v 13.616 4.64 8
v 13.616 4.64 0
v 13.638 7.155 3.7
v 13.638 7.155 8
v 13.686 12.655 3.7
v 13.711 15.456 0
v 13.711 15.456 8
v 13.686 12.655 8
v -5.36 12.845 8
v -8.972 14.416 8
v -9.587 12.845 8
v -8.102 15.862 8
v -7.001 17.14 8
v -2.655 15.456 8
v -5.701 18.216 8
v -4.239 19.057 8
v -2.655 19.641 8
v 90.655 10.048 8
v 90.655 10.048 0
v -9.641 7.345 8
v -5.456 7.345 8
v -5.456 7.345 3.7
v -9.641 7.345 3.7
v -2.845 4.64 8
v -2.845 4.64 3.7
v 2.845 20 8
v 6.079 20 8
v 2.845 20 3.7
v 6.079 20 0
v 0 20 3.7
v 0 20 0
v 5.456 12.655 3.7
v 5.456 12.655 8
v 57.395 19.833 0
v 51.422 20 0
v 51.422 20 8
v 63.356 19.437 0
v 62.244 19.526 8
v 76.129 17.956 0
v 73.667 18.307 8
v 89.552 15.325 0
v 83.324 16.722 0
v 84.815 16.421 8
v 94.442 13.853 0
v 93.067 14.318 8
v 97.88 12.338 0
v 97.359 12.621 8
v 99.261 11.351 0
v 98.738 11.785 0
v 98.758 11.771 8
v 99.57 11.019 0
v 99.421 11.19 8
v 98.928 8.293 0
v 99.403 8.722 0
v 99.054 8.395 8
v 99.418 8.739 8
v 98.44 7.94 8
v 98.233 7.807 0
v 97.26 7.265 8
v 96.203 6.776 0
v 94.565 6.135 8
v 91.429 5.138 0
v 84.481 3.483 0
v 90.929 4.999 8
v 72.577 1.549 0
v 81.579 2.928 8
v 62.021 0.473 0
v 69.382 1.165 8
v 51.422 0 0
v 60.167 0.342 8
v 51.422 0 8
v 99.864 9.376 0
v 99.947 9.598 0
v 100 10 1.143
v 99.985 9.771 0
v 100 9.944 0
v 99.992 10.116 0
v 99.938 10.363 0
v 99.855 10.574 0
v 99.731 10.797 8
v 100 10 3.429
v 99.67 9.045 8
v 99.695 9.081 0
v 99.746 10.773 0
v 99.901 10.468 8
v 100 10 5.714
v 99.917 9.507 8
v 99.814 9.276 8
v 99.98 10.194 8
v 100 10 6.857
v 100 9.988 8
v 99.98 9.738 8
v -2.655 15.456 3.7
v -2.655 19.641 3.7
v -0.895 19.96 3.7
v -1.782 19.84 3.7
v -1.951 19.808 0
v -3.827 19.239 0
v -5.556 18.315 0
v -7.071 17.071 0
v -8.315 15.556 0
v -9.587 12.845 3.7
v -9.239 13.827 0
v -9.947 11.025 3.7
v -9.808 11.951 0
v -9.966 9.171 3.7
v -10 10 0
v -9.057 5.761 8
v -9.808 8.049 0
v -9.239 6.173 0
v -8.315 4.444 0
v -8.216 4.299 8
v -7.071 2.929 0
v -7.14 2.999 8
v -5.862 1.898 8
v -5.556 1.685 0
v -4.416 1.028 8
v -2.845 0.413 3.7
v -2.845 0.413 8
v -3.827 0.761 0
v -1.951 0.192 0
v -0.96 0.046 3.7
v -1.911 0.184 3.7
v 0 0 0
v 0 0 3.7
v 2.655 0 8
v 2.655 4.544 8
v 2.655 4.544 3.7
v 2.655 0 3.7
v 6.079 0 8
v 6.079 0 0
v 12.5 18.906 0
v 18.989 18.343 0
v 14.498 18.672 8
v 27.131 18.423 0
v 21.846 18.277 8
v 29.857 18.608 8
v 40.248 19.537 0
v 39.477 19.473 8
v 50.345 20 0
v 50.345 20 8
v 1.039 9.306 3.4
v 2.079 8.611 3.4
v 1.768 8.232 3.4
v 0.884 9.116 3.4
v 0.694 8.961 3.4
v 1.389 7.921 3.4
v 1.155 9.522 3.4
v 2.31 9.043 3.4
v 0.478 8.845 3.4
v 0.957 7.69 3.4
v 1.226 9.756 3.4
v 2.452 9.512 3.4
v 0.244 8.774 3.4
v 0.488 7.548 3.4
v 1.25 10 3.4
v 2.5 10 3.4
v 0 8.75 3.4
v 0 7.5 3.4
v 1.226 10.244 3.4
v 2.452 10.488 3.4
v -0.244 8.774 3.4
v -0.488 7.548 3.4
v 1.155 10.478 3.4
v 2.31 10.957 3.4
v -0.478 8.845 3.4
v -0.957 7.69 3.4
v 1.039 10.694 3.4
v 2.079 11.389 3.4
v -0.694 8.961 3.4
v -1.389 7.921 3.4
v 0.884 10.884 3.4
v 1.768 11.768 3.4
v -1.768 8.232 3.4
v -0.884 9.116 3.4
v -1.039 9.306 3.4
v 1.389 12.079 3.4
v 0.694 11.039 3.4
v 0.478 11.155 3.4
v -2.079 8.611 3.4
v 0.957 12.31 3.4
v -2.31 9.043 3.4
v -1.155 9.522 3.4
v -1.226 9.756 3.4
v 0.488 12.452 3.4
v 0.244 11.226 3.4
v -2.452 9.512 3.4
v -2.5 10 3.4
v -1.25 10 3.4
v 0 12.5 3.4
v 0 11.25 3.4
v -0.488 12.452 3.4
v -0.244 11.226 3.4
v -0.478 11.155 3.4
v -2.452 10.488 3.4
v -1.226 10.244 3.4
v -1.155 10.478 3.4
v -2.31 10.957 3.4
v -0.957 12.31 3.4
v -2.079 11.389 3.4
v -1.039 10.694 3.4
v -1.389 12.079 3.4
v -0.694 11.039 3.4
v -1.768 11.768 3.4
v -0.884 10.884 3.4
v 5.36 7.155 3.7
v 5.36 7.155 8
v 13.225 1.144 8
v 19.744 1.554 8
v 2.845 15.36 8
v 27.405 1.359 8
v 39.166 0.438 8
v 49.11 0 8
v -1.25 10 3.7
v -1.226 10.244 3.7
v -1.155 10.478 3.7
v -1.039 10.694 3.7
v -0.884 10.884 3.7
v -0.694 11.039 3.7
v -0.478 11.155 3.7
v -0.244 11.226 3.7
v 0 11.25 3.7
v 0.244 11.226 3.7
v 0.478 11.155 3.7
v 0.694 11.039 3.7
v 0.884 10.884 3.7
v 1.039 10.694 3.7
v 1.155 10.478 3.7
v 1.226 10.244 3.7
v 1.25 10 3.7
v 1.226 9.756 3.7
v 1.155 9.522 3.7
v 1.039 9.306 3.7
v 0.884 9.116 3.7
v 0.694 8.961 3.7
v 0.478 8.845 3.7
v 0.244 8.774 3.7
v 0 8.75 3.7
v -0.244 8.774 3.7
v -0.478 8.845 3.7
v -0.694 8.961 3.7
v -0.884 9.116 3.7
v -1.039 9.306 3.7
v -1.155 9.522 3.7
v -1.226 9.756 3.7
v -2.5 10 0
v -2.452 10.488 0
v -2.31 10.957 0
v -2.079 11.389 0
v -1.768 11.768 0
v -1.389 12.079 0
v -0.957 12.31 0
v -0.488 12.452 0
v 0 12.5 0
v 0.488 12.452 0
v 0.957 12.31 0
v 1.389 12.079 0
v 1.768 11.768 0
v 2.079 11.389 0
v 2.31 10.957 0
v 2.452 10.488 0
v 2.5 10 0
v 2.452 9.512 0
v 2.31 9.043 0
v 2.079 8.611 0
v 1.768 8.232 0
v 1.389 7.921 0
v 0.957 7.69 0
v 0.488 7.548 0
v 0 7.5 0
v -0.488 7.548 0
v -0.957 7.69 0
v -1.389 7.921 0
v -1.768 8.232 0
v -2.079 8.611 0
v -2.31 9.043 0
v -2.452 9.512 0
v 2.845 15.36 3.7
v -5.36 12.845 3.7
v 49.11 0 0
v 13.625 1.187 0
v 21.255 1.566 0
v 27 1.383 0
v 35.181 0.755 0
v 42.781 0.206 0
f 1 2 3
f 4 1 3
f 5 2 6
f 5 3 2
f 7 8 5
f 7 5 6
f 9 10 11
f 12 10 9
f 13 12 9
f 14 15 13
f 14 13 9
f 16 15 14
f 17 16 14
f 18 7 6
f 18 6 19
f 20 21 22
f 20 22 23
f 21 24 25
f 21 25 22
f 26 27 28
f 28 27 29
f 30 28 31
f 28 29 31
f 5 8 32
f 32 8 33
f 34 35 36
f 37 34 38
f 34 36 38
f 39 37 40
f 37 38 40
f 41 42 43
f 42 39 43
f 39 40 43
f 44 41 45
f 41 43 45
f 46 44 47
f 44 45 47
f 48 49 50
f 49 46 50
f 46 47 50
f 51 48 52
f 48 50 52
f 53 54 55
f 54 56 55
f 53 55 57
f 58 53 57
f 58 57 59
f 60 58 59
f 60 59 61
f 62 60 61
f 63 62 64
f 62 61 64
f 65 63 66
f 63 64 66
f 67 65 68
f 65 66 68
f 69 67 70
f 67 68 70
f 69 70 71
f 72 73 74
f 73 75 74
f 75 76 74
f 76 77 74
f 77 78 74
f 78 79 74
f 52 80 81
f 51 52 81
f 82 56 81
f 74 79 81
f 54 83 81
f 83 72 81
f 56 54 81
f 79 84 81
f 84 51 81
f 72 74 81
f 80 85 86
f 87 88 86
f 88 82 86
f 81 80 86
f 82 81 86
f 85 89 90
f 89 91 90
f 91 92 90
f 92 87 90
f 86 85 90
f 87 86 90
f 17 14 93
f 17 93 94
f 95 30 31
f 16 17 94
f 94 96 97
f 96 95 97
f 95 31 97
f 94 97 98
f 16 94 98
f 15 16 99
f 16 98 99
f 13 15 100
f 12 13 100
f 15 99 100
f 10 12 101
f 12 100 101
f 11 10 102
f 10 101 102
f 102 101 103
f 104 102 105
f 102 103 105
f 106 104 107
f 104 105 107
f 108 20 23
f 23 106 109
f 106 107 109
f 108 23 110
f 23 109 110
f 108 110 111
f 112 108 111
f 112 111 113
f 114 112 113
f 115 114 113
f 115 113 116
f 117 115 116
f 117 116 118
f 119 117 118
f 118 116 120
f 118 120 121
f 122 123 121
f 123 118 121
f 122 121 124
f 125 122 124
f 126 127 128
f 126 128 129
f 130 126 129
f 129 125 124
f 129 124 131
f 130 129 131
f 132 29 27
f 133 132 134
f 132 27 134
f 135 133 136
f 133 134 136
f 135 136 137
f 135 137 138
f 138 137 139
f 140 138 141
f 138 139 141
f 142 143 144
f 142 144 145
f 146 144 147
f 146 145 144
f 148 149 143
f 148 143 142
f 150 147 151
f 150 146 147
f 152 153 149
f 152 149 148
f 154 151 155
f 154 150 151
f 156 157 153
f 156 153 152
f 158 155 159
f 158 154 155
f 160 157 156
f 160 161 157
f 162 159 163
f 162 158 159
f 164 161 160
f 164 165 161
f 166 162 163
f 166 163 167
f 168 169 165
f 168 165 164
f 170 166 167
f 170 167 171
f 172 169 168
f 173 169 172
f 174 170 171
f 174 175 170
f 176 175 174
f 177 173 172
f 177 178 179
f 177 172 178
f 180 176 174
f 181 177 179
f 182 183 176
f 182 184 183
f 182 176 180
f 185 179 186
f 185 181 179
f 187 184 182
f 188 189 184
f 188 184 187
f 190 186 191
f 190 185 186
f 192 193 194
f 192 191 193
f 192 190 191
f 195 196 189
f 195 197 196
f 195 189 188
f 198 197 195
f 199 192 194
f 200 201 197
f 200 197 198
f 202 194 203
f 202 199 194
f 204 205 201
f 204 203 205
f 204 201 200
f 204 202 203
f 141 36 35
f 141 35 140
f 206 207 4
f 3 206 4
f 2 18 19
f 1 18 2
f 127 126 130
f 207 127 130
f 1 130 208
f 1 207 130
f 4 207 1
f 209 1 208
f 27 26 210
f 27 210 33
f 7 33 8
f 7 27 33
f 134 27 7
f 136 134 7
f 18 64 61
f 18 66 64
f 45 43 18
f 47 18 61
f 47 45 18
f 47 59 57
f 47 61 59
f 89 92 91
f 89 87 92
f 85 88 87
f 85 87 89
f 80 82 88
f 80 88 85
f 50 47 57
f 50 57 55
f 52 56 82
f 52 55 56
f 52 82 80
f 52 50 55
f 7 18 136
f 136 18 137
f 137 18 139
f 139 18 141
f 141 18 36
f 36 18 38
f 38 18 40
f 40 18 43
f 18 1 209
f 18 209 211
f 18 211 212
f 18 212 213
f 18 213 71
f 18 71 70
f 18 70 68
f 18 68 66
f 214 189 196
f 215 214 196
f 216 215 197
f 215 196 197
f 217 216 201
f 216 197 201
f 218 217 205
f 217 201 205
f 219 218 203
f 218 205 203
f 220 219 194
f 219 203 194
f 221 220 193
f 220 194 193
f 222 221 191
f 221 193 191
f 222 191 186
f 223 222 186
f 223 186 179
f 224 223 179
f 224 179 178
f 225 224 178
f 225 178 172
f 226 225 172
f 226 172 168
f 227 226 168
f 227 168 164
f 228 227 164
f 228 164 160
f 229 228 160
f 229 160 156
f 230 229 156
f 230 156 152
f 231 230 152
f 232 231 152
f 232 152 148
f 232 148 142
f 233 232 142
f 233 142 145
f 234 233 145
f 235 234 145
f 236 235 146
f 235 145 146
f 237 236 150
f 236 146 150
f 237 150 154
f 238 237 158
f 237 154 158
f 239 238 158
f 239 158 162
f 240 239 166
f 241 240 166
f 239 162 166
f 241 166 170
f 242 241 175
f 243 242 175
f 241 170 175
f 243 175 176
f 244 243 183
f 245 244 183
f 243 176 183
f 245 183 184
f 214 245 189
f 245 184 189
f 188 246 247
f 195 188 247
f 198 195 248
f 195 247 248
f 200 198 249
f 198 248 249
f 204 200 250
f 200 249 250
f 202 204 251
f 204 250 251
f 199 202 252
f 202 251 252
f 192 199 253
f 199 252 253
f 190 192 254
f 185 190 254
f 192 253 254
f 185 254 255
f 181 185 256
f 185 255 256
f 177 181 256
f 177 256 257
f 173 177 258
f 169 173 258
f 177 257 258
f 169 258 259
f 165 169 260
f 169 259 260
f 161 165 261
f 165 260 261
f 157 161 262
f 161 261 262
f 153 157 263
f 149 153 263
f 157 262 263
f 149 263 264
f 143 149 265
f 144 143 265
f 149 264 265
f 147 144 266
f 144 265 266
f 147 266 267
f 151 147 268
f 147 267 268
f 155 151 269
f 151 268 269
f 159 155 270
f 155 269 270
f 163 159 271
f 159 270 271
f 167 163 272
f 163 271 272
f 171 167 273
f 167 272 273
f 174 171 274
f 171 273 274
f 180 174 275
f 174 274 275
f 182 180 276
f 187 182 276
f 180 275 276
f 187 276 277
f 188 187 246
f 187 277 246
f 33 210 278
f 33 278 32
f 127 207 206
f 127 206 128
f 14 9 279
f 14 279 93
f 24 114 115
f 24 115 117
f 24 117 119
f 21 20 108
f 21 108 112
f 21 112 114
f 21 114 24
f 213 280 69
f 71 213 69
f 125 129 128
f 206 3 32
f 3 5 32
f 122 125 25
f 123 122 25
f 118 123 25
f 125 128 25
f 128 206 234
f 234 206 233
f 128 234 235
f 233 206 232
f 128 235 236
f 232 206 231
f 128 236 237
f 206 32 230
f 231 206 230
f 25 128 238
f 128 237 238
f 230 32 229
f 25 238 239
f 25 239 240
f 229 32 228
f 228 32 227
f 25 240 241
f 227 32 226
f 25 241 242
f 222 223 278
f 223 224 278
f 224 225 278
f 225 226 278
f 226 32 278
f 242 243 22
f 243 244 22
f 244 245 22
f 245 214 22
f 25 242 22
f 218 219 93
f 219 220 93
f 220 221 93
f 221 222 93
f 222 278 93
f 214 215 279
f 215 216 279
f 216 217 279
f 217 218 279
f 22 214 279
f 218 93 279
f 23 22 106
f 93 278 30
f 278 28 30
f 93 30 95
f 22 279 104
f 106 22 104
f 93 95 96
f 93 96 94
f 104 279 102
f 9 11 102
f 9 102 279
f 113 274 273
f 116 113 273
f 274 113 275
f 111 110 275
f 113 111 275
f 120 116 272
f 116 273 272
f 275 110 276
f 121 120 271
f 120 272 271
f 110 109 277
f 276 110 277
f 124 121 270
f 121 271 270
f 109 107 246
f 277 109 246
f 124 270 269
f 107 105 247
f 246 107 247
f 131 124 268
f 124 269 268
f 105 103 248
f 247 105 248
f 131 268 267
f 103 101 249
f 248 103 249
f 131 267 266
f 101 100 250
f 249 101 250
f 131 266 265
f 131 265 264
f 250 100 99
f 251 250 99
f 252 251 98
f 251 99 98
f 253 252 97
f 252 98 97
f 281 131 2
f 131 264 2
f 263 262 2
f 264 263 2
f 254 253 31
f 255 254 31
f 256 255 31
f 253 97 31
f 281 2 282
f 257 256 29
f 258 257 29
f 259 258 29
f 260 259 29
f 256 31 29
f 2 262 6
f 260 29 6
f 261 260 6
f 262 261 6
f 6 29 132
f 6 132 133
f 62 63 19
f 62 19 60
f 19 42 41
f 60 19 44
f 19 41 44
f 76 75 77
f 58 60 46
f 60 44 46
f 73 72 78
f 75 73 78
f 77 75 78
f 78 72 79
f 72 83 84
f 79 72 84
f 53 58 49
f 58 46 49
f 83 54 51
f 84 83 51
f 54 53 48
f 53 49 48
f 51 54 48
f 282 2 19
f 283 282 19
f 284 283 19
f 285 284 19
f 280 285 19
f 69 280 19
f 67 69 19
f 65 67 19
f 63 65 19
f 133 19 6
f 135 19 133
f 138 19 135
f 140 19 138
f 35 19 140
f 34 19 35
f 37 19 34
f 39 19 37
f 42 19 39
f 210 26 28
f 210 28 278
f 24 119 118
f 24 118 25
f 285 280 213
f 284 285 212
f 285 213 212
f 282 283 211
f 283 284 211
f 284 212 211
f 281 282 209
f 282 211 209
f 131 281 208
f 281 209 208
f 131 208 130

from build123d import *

# Parameters (mm, degrees)
BOSS_EXTRU_1_DEPTH       = 8
ESQUISSE13_R             = 4
ENL_V_MAT_EXTRU_9_DEPTH  = 4.3
ENL_V_MAT_EXTRU_10_DEPTH = 4.3
ESQUISSE15_R             = 2.5
ENL_V_MAT_EXTRU_11_DEPTH = 3.4
ENL_V_MAT_EXTRU_12_REACH = 113.898
ESQUISSE16_R             = 1.25
ESQUISSE17_OUTSIDE_W     = 146.384
ESQUISSE17_OUTSIDE_H     = 46.384
ENL_V_MAT_EXTRU_13_DEPTH = 10
ENL_V_MAT_EXTRU_14_DEPTH = 10


with BuildPart() as part:
    # Esquisse1 → Boss.-Extru.1 (new body)
    with BuildSketch(Plane.XY):
        with BuildLine():
            Line((0, 0), (100, 0))
            ThreePointArc((100, 0), (110, 10), (100, 20))
            Line((100, 20), (0, 20))
            ThreePointArc((0, 20), (-10, 10), (0, 0))
        make_face()
    extrude(amount=BOSS_EXTRU_1_DEPTH)

    # Esquisse13 → Enlèv. mat.-Extru.9 (cut)
    with BuildSketch(Plane.XY.offset(8)):
        with Locations((0, 10)):
            Circle(ESQUISSE13_R)
    extrude(amount=-ENL_V_MAT_EXTRU_9_DEPTH, mode=Mode.SUBTRACT)

    # Esquisse14 → Enlèv. mat.-Extru.10 (cut)
    with BuildSketch(Plane.XY.offset(8)):
        Polygon((2.655377087, 4.544050257), (2.655377087, -2.008601379), (-2.844622913, -1.912365766), (-2.844622913, 4.640285869), (-5.455949743, 7.344622913), (-12.008601379, 7.344622913), (-11.912365766, 12.844622913), (-5.359714131, 12.844622913), (-2.655377087, 15.455949743), (-2.655377087, 22.008601379), (2.844622913, 21.912365766), (2.844622913, 15.359714131), (5.455949743, 12.655377087), (12.008601379, 12.655377087), (17.818097103, 12.655377087), (17.818097103, 7.155377087), (11.912365766, 7.155377087), (5.359714131, 7.155377087), align=None)
    extrude(amount=-ENL_V_MAT_EXTRU_10_DEPTH, mode=Mode.SUBTRACT)

    # Esquisse15 → Enlèv. mat.-Extru.11 (cut)
    with BuildSketch(Plane(origin=(0, 0, 0), x_dir=(-1, 0, 0), z_dir=(0, 0, -1))):
        with Locations((0, 10)):
            Circle(ESQUISSE15_R)
    extrude(amount=-ENL_V_MAT_EXTRU_11_DEPTH, mode=Mode.SUBTRACT)

    # Esquisse16 → Enlèv. mat.-Extru.12 (cut, up to next)
    with BuildSketch(Plane(origin=(0, 0, 3.4), x_dir=(-1, 0, 0), z_dir=(0, 0, -1)), mode=Mode.PRIVATE) as enl_v_mat_extru_12_sk1:
        with Locations((0, 10)):
            Circle(ESQUISSE16_R)
    enl_v_mat_extru_12_tool1 = extrude(enl_v_mat_extru_12_sk1.sketch, amount=-ENL_V_MAT_EXTRU_12_REACH, mode=Mode.PRIVATE) & part.part
    add(enl_v_mat_extru_12_tool1.solids().sort_by_distance((0, 10, 3.4))[0], mode=Mode.SUBTRACT)

    # Esquisse17 outside → Enlèv. mat.-Extru.13 (cut)
    with BuildSketch(Plane.XY.offset(8)):
        with Locations((50, 10)):
            Rectangle(ESQUISSE17_OUTSIDE_W, ESQUISSE17_OUTSIDE_H)
        with BuildLine():
            add(Edge.make_bspline(
                [(6.078713642, 20), (24.915023514, 16.081550404), (43.772946516, 24.459557565), (129.172588167, 9.95529611), (44.539574838, -4.288408378), (17.569235721, 5.732265476), (-18.329346207, -7.417520102), (-23.15173951, 28.634629281), (-5.183949024, 22.342931088), (6.078713642, 20)],
                knots=[0, 0, 0, 0, 0.182524448, 0.382167519, 0.581810591, 0.764335038, 0.867297941, 0.890864437, 1, 1, 1, 1], degree=3))
        make_face(mode=Mode.SUBTRACT)
    extrude(amount=-ENL_V_MAT_EXTRU_13_DEPTH, mode=Mode.SUBTRACT)

    # Esquisse18 → Enlèv. mat.-Extru.14 (cut)
    with BuildSketch(Plane.XY.offset(8)):
        Polygon((13.616328718, 4.640285869), (13.71095163, 15.455949743), (90.655144278, 10.048117806), align=None)
    extrude(amount=-ENL_V_MAT_EXTRU_14_DEPTH, mode=Mode.SUBTRACT)


solid = part.part
